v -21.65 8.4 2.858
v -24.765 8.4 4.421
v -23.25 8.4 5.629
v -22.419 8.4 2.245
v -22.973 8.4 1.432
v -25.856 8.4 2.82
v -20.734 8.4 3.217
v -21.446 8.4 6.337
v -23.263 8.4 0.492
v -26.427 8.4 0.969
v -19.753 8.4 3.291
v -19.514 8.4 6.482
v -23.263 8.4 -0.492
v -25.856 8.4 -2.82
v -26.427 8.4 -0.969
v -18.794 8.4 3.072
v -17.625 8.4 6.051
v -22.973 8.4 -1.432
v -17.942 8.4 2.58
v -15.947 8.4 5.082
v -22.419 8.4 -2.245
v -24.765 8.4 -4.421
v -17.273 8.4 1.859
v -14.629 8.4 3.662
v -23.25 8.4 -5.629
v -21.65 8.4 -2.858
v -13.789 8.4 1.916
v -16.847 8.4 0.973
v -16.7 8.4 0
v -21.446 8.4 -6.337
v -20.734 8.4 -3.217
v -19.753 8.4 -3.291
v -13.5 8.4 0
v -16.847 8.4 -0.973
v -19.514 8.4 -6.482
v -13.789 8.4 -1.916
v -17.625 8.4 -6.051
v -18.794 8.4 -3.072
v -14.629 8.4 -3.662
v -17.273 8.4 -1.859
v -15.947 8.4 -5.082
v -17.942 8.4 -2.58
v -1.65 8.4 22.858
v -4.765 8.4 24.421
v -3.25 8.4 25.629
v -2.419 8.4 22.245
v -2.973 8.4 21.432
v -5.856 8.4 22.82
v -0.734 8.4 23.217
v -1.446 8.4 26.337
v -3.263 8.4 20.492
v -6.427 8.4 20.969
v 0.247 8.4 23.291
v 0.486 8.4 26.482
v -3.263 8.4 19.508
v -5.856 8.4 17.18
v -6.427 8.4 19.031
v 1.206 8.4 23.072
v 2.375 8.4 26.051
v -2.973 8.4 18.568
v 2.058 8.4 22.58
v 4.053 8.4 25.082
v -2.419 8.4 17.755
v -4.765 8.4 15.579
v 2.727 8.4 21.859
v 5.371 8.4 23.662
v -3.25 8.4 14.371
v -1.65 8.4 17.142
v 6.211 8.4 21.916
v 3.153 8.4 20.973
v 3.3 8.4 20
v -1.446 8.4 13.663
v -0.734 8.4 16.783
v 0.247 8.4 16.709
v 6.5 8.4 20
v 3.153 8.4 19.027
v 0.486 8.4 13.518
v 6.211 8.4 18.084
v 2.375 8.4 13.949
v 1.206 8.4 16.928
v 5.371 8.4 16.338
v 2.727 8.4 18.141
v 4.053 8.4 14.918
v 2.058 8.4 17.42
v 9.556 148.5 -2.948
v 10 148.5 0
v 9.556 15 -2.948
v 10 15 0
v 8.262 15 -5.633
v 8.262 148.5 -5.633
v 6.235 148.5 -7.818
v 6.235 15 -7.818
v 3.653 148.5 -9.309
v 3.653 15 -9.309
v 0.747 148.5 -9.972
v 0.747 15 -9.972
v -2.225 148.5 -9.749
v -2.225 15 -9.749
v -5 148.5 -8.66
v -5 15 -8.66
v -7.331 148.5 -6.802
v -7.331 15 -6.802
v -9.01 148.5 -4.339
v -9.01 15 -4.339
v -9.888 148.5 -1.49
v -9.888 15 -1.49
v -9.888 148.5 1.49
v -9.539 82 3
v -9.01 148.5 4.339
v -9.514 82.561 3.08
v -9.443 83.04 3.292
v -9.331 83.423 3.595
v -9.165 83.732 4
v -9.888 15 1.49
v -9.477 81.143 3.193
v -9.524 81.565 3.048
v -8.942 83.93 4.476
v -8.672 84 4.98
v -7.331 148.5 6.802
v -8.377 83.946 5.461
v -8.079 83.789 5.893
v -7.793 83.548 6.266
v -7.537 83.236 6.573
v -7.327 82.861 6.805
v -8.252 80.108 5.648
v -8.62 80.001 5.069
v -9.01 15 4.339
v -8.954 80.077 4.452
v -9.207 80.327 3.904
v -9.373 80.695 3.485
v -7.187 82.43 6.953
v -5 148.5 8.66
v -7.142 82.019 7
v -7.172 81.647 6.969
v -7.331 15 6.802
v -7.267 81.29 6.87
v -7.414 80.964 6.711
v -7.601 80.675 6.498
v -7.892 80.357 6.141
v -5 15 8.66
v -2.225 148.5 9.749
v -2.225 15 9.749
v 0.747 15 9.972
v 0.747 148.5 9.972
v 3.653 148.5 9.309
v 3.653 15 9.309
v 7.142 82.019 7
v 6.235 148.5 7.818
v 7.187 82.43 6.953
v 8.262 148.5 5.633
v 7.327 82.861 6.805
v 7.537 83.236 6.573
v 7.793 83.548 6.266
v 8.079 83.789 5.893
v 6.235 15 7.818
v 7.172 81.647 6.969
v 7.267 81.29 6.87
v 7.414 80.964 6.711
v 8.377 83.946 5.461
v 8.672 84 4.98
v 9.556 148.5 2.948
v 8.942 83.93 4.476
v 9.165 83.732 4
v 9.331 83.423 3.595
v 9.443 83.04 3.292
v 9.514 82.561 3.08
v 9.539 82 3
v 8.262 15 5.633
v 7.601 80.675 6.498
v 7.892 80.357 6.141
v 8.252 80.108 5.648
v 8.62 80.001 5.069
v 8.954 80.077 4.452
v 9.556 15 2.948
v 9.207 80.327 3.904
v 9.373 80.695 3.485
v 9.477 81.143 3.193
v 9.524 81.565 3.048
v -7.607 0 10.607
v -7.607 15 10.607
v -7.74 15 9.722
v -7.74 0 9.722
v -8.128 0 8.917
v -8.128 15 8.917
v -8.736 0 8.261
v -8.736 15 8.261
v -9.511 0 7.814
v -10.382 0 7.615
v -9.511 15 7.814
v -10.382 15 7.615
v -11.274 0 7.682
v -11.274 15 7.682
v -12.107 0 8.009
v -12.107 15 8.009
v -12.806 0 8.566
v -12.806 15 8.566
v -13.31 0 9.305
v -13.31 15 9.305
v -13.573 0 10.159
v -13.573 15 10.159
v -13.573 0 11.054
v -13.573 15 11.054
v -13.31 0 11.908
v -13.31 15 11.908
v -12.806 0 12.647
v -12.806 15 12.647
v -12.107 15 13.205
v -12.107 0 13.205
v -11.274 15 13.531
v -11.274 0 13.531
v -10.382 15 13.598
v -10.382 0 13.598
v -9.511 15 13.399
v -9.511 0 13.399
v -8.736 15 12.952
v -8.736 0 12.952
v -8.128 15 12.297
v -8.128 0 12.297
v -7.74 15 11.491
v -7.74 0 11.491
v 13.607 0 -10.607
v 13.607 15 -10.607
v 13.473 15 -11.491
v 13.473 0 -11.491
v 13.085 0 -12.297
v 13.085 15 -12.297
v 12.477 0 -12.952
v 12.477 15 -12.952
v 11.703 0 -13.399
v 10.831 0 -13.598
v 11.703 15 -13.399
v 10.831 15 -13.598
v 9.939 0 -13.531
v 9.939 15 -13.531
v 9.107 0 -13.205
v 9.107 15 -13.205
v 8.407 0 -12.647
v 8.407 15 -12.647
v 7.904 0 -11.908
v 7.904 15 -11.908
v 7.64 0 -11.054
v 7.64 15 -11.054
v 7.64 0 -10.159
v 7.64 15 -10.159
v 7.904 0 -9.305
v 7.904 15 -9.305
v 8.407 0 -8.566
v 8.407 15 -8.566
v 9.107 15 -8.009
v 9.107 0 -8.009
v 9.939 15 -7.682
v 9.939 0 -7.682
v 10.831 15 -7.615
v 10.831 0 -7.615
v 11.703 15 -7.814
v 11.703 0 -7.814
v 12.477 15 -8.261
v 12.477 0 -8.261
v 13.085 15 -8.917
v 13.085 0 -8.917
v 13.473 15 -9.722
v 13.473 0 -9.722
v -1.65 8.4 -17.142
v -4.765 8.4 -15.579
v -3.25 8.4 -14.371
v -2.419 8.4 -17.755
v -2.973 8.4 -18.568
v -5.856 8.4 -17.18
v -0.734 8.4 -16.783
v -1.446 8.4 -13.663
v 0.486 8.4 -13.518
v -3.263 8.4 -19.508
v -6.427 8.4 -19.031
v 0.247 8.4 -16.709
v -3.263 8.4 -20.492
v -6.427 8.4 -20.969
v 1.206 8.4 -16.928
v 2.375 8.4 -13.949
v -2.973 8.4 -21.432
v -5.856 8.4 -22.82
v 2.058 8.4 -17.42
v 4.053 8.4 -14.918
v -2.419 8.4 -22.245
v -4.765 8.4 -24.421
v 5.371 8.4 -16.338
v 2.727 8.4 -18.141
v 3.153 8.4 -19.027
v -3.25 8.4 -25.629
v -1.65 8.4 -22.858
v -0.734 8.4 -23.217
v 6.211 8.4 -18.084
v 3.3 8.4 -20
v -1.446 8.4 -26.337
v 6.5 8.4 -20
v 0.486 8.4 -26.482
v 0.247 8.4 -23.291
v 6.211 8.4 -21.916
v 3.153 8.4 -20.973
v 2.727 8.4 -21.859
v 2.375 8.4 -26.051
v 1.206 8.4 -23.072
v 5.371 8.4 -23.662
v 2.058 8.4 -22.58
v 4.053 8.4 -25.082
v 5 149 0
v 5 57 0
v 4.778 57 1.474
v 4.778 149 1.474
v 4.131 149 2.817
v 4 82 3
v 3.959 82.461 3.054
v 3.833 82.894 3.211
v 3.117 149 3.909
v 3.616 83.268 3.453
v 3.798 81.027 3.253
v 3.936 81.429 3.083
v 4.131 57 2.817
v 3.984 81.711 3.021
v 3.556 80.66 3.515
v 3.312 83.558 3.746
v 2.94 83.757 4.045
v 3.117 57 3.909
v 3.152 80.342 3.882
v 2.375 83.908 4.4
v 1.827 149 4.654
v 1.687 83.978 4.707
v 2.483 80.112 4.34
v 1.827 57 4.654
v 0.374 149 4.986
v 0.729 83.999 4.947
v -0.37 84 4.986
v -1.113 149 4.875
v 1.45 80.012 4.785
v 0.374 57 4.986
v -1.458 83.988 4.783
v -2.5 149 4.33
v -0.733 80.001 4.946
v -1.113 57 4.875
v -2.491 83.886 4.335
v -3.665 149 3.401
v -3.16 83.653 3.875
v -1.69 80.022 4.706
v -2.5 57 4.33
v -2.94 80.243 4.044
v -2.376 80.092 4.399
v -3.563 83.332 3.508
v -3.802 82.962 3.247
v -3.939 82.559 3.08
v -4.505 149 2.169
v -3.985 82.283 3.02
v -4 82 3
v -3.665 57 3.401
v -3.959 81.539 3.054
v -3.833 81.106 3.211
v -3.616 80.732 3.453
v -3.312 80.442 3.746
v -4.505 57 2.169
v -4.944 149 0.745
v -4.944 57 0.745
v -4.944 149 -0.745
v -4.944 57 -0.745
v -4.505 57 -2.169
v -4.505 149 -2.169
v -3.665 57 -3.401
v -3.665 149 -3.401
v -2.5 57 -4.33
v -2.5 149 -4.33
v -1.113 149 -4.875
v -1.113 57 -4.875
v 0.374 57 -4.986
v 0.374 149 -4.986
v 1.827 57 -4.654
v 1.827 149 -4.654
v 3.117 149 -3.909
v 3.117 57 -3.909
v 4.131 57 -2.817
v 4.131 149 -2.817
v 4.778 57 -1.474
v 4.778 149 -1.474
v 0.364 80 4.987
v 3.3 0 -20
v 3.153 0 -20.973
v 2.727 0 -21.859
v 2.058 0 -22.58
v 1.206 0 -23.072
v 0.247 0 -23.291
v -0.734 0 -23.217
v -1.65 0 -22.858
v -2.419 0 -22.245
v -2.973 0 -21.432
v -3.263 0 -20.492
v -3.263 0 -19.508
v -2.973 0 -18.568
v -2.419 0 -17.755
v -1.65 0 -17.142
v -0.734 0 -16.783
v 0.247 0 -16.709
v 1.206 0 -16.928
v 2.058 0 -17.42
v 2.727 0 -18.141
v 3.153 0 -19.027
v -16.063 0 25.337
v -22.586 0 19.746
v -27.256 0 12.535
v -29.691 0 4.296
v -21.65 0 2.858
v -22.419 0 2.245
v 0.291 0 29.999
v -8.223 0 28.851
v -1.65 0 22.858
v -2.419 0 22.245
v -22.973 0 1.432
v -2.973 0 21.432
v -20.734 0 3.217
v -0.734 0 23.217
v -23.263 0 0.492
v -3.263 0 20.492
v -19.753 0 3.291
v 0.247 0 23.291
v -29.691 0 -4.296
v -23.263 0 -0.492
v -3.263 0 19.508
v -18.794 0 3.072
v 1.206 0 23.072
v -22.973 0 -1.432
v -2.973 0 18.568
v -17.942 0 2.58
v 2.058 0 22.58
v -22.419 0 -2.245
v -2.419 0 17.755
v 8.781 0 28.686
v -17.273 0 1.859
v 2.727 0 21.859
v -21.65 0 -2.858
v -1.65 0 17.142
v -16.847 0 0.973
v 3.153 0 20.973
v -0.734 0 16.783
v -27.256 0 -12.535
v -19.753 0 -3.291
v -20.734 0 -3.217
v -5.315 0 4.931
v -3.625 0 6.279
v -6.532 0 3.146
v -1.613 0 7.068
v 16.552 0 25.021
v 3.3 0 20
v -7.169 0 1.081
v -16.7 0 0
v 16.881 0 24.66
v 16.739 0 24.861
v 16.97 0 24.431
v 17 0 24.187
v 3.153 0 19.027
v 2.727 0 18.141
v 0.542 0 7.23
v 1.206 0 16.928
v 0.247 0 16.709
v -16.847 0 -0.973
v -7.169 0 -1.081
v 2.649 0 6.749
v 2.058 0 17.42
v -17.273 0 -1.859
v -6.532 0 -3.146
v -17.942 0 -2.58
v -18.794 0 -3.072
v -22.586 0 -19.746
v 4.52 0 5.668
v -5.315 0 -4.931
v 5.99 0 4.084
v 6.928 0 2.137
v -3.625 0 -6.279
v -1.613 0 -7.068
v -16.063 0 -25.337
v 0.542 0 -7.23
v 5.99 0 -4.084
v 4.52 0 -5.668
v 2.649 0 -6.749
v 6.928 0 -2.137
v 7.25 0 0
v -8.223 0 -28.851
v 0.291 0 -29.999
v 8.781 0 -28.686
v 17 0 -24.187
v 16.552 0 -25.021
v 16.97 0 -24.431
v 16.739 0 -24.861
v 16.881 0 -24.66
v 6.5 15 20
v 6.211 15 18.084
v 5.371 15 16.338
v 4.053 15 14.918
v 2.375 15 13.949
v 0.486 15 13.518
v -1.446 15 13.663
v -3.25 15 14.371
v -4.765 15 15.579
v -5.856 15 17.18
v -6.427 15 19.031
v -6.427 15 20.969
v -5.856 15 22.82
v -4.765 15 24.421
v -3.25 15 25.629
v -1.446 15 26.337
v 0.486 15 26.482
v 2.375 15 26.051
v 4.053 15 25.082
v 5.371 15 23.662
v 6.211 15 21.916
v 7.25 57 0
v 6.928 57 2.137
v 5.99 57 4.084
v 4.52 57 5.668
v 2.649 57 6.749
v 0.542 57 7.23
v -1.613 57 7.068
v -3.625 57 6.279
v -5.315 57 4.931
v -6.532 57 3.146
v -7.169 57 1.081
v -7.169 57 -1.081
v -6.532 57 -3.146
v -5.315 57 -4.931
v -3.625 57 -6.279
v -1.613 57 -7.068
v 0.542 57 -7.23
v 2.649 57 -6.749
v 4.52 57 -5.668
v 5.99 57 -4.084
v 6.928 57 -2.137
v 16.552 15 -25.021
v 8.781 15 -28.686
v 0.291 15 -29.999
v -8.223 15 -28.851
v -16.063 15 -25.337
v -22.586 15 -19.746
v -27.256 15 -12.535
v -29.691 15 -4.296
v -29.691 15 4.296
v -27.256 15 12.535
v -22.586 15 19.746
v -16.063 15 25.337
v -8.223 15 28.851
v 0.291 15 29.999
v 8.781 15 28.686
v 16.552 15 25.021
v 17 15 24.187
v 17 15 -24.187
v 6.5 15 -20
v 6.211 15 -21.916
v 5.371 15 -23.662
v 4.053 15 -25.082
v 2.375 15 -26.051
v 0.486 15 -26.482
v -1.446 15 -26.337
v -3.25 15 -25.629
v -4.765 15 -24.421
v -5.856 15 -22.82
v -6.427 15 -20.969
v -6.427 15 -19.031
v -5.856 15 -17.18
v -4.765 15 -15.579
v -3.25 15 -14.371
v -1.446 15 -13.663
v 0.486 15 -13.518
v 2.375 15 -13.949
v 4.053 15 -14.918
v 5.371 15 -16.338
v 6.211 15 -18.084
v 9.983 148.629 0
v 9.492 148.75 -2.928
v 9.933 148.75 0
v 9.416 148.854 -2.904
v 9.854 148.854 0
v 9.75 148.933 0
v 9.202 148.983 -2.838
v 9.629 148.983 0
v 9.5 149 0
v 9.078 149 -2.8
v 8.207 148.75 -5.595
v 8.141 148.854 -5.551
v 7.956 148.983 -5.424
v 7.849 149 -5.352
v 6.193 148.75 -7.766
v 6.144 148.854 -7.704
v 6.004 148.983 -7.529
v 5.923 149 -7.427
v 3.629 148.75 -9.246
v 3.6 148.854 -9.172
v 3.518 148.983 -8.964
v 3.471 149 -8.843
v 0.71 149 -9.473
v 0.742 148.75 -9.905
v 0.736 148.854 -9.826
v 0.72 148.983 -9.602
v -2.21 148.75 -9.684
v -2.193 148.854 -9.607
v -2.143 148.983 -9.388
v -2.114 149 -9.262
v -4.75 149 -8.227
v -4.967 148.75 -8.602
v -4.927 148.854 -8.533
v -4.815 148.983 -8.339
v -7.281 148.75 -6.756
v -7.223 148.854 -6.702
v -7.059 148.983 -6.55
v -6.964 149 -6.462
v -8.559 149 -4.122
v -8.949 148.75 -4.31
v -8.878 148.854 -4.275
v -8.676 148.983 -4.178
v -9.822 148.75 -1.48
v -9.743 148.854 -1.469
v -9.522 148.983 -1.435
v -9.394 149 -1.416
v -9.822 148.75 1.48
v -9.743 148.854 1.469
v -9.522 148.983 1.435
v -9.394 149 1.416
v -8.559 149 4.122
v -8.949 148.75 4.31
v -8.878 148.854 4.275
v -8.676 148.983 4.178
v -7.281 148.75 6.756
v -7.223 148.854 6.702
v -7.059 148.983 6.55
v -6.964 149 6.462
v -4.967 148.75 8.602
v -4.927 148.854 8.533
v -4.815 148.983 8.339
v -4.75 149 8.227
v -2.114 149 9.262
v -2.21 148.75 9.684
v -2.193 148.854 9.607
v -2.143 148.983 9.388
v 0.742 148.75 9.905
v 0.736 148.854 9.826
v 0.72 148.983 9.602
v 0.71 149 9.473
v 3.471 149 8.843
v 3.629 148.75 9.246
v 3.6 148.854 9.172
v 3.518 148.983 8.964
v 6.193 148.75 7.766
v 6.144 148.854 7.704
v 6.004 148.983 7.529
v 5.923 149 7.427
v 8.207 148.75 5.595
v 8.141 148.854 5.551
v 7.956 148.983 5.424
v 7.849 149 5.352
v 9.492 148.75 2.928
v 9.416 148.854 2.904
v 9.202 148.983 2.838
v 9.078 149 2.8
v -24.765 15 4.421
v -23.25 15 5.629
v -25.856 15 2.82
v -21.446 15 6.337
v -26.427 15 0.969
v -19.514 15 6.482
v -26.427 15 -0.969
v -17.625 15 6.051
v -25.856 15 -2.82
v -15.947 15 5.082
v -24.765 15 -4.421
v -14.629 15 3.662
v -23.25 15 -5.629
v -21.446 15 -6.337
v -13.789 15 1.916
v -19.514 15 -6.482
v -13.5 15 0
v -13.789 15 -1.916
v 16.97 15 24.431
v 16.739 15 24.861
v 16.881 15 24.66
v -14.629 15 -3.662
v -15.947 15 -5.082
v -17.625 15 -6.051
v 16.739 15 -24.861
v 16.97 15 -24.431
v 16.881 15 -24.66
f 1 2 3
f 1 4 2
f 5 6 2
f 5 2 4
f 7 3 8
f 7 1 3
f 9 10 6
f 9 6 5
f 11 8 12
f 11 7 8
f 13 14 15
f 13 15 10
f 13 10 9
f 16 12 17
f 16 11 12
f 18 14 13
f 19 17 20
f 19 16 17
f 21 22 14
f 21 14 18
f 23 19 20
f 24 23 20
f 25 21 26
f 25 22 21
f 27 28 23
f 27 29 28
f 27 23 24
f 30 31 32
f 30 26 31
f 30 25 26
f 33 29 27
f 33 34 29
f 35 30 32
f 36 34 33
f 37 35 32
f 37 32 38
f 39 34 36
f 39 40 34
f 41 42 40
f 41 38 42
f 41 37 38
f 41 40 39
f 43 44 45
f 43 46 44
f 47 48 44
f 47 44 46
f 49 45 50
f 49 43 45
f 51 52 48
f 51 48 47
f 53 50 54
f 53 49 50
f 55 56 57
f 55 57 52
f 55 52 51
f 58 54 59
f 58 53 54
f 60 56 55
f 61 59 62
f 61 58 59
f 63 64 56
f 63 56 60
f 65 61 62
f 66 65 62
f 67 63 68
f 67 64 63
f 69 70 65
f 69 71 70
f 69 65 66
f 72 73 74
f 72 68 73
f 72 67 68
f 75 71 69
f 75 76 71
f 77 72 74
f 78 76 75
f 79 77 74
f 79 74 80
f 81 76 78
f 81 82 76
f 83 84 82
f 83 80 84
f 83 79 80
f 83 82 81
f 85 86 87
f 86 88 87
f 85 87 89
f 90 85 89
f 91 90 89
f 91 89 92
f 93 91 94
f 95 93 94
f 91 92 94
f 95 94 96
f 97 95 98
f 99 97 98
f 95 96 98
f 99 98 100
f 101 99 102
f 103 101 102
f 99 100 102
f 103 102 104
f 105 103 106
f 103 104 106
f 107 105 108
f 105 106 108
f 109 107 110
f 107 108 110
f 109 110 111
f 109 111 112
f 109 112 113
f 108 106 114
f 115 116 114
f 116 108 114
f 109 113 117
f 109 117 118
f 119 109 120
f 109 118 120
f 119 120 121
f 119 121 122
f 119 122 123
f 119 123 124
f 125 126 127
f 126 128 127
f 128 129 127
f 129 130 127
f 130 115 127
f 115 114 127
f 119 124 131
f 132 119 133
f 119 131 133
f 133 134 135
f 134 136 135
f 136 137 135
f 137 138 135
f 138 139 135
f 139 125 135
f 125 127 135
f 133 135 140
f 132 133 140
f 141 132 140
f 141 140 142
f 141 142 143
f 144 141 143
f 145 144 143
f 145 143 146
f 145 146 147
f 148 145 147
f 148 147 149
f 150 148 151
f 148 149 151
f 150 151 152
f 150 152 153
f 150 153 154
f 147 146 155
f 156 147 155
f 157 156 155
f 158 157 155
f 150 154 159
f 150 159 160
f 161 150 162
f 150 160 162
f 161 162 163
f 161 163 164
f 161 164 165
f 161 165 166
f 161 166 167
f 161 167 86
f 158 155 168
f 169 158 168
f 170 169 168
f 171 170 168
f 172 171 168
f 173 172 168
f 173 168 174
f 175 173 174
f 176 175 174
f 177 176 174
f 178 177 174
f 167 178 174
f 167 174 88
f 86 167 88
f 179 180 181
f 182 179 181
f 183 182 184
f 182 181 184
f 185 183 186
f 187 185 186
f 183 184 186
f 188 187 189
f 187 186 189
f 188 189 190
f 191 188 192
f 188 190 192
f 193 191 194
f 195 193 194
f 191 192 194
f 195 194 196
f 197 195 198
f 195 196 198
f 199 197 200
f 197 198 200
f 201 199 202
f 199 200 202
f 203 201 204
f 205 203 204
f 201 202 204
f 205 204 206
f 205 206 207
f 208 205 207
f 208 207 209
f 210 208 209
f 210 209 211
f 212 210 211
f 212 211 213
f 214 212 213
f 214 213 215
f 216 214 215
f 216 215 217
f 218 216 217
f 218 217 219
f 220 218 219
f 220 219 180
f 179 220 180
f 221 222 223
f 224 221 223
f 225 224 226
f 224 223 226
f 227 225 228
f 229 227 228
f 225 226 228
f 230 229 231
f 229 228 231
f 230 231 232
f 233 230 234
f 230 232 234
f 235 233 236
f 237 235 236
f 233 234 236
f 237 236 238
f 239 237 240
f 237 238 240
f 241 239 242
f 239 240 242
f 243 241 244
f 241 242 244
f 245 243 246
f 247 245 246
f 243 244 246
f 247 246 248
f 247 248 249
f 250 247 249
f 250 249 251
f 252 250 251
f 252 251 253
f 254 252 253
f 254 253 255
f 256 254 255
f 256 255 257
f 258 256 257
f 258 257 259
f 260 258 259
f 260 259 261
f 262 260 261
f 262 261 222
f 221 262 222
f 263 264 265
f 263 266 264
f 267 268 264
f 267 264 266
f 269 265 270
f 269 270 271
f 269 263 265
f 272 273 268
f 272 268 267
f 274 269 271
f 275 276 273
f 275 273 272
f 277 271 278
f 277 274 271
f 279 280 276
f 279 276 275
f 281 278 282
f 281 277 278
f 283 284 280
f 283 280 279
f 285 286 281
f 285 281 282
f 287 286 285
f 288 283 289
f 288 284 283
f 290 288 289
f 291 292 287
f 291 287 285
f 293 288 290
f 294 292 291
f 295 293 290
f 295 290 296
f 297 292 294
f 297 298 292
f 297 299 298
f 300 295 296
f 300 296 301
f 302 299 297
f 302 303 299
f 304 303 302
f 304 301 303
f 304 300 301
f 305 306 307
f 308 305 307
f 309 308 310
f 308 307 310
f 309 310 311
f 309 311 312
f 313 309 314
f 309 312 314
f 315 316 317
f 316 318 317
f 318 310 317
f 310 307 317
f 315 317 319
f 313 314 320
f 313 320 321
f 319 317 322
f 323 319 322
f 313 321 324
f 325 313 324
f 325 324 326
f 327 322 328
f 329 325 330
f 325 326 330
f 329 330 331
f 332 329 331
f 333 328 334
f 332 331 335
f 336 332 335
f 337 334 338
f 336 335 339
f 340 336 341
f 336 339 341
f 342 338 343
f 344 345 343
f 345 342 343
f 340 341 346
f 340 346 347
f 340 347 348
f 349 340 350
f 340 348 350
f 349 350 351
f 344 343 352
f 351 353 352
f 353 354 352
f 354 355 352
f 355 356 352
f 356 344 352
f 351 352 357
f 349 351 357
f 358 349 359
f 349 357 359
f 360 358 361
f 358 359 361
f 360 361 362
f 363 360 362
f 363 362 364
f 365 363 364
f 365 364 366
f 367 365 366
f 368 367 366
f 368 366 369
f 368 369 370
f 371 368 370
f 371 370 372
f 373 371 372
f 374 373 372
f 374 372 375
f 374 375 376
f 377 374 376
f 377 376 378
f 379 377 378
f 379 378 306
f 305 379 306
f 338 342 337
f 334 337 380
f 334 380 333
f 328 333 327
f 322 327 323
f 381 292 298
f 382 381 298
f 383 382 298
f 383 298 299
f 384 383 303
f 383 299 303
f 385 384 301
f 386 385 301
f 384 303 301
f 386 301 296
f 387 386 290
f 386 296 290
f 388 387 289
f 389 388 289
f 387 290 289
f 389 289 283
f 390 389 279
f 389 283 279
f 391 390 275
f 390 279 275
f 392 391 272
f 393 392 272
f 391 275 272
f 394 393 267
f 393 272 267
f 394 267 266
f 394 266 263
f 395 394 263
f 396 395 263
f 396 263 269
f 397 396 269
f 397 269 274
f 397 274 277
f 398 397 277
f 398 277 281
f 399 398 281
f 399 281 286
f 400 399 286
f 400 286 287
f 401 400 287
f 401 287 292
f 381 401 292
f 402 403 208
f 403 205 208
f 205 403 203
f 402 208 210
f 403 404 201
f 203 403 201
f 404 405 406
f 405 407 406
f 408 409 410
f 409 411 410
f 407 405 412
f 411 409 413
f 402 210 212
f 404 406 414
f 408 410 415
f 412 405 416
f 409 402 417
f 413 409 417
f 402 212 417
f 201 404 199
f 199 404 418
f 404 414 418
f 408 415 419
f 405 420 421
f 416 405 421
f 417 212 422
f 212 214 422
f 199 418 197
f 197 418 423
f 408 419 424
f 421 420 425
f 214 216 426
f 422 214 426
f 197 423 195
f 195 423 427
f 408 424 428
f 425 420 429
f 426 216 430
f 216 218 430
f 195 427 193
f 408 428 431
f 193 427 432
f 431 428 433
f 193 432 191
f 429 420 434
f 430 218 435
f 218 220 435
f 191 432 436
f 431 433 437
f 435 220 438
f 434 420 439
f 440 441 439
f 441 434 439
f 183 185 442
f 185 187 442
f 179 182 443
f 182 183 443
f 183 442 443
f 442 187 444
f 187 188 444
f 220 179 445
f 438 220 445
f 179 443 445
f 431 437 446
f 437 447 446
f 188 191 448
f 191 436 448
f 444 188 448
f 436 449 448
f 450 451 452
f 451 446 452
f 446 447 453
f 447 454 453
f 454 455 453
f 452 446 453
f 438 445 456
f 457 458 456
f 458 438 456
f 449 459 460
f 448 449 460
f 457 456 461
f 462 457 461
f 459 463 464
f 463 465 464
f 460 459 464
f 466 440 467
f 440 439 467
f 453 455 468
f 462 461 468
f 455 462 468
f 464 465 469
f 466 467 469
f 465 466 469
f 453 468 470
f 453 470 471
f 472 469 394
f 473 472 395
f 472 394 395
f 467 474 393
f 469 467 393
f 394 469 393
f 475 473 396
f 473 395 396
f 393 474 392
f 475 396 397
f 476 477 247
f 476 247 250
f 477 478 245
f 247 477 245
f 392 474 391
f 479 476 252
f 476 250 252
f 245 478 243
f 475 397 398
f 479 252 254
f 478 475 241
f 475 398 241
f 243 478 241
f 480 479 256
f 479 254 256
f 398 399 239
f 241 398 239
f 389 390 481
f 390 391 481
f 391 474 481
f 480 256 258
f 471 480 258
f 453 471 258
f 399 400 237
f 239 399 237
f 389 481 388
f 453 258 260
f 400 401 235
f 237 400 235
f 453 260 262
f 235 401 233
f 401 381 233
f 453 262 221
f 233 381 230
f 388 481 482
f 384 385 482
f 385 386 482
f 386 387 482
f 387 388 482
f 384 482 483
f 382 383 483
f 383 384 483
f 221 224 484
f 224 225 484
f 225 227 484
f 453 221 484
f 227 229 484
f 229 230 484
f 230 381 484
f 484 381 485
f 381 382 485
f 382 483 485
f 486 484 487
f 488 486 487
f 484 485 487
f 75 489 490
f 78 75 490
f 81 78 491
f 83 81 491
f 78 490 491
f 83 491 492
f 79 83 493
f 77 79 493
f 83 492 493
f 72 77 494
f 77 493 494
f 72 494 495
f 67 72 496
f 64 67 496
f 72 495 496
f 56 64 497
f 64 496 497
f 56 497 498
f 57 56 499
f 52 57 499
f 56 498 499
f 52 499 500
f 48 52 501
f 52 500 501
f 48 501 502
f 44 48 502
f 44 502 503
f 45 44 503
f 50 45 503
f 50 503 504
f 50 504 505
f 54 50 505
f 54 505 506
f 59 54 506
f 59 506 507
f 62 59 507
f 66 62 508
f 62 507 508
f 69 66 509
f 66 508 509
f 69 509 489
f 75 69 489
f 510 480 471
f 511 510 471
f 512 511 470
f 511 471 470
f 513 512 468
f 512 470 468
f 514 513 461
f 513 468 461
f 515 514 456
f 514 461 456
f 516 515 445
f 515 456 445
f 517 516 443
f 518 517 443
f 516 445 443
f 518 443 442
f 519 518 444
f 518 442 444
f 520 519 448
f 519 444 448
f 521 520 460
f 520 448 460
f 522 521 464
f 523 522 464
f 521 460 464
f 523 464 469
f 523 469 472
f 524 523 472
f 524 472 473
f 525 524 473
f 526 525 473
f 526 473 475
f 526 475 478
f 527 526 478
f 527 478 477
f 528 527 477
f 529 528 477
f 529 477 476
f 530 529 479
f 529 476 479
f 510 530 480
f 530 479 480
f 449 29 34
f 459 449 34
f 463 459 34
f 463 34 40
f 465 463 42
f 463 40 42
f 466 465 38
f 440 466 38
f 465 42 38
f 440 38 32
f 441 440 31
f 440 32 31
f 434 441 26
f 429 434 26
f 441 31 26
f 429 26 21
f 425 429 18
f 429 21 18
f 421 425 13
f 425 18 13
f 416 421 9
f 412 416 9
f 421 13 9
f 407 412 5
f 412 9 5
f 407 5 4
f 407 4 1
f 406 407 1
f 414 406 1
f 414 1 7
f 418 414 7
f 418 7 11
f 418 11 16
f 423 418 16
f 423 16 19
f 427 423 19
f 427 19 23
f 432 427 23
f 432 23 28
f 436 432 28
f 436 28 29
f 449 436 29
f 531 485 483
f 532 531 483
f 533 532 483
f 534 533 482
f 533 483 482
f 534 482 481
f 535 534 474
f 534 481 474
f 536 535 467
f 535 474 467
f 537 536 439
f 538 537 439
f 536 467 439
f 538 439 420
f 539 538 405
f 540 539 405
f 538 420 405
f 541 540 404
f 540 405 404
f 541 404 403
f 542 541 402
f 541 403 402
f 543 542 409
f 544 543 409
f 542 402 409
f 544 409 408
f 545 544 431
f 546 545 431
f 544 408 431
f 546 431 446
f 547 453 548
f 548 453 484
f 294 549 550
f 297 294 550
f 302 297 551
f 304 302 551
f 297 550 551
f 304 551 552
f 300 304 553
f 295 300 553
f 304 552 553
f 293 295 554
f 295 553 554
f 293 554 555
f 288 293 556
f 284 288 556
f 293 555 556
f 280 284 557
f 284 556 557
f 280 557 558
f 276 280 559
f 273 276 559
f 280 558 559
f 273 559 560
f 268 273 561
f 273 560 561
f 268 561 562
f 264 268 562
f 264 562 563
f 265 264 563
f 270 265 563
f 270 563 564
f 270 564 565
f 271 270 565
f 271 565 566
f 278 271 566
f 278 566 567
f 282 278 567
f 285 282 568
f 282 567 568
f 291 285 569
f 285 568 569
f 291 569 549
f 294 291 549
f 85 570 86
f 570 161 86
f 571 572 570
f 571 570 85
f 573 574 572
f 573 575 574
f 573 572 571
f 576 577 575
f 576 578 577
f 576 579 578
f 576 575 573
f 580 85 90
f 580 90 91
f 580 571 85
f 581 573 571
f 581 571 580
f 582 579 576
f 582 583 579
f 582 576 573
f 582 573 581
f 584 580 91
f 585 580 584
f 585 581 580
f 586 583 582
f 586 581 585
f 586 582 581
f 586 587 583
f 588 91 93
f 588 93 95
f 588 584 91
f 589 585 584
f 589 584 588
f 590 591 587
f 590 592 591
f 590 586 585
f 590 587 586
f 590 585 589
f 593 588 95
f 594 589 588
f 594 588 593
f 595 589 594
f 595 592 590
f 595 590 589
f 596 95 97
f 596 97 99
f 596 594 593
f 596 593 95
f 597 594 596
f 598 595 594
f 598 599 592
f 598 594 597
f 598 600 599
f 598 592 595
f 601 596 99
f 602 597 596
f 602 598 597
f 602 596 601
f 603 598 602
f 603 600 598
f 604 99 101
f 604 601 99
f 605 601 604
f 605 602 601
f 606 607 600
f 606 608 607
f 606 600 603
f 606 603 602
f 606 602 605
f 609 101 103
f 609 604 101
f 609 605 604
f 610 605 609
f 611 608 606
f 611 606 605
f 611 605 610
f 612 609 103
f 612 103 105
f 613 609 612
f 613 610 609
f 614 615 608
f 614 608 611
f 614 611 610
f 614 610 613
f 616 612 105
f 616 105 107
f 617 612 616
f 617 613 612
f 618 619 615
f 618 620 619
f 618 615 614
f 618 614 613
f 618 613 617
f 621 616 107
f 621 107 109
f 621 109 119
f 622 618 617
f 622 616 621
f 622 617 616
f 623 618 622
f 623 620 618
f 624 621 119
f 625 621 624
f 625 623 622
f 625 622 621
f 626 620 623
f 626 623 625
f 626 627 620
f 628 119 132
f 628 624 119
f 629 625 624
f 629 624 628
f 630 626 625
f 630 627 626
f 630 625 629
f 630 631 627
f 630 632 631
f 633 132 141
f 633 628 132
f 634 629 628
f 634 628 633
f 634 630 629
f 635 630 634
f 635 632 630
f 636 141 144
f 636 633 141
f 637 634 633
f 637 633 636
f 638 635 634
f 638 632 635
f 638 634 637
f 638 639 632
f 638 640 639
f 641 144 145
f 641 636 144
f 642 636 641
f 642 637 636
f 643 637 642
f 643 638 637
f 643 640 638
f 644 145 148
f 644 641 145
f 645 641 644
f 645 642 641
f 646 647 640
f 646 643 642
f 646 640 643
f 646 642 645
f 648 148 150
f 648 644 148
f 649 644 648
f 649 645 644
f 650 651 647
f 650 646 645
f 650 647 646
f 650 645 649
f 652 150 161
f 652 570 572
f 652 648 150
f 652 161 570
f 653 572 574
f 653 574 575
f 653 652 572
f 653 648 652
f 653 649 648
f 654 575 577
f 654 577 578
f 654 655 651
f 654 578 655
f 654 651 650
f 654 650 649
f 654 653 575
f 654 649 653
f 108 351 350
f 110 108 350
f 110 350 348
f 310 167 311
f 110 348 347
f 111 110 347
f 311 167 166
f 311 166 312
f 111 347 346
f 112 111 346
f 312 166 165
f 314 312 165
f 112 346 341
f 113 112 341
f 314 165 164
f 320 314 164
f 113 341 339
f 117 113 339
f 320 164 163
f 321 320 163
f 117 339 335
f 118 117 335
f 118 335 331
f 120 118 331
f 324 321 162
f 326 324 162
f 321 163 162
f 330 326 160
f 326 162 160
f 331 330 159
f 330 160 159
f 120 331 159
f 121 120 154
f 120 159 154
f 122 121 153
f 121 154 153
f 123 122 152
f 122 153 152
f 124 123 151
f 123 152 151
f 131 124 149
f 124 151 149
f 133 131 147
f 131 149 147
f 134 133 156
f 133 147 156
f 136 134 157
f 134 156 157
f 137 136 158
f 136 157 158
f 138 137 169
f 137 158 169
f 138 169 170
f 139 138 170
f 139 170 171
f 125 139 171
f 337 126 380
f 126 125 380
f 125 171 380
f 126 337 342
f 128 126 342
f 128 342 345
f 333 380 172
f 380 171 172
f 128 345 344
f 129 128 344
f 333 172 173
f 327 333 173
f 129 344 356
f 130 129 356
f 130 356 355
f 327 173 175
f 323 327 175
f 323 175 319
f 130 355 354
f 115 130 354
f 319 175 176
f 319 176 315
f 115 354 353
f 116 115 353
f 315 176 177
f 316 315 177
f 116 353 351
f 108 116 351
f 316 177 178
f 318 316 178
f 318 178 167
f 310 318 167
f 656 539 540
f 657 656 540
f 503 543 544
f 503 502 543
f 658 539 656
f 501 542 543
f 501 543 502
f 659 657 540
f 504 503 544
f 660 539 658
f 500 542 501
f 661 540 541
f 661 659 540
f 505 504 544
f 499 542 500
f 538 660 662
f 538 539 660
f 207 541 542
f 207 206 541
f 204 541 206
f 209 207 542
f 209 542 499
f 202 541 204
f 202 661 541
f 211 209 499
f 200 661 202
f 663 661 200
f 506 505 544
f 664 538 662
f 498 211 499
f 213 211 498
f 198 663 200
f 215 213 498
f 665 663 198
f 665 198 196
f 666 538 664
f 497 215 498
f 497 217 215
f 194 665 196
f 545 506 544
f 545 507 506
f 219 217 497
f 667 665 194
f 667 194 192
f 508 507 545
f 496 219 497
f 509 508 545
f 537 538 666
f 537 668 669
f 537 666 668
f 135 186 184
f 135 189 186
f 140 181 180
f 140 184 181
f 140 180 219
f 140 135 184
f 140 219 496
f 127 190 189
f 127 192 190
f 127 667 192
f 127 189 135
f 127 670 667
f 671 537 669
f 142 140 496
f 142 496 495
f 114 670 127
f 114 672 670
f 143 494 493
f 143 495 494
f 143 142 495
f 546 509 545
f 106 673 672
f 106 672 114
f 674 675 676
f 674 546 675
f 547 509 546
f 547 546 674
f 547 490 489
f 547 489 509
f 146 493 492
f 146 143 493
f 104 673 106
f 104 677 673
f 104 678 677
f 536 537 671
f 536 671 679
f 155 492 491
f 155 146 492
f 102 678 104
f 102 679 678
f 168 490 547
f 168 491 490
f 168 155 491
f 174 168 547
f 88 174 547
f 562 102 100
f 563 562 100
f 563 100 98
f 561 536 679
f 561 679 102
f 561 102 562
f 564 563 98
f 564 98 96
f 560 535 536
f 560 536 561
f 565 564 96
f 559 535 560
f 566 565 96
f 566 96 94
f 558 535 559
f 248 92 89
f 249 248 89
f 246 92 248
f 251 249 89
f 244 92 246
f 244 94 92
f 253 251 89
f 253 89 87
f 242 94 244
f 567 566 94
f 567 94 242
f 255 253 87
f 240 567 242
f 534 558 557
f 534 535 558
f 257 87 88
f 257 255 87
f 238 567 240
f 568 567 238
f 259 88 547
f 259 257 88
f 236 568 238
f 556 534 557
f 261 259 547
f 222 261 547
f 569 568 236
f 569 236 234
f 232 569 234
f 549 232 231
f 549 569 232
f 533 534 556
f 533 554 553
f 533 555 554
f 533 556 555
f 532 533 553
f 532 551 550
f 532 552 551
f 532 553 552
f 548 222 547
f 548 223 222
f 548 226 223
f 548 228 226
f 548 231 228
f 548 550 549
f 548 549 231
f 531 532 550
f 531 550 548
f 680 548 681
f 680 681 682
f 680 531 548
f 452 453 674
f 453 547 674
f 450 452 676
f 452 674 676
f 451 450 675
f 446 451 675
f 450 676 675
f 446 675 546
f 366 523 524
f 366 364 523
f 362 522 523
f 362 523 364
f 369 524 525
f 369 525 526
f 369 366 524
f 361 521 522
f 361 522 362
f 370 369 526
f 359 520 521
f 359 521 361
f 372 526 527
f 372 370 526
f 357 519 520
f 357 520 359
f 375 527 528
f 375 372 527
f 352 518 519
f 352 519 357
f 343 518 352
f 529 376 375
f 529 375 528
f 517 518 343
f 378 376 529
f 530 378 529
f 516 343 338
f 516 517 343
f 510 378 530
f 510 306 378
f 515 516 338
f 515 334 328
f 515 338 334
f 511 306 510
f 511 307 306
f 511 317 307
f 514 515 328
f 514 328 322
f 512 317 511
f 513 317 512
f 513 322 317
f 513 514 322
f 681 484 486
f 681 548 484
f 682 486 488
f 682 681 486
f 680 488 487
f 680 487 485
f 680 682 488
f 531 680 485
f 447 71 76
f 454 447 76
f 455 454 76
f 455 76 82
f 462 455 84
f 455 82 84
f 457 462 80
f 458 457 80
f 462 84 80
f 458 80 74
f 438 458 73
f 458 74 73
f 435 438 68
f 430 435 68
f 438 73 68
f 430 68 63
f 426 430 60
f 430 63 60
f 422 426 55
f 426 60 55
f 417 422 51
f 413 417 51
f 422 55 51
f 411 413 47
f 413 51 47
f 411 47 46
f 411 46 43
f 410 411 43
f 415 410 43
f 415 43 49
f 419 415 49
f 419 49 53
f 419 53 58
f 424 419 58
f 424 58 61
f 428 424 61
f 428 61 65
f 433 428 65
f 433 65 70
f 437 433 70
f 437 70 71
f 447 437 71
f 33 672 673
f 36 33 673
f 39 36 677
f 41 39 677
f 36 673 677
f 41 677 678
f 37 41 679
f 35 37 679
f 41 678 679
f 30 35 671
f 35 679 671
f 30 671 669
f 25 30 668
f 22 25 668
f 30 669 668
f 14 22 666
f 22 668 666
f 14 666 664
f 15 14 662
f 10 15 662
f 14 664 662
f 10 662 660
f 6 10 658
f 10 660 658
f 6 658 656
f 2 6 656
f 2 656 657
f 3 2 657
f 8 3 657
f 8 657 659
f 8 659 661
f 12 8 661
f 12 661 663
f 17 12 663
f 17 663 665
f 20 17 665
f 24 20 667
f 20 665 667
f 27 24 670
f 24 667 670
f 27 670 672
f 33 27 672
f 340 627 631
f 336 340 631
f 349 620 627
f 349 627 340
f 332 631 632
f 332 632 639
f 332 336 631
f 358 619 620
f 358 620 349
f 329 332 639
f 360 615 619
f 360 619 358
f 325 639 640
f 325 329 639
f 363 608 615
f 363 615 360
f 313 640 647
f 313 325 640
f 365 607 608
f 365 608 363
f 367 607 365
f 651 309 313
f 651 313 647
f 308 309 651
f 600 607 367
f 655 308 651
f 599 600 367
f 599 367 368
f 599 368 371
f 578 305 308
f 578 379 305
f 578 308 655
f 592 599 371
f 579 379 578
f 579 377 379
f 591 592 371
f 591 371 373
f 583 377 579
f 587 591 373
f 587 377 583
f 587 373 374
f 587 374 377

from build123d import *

# Parameters (mm, degrees)
BOSS_EXTRUDE1_DEPTH = 15
SKETCH2_R           = 10
BOSS_EXTRUDE2_DEPTH = 134
SKETCH4_R           = 7.25
CUT_EXTRUDE1_DEPTH  = 57
SKETCH5_R           = 5
CUT_EXTRUDE2_DEPTH  = 93
SKETCH7_R           = 6.5
CUT_EXTRUDE3_DEPTH  = 6.6
SKETCH8_R           = 3.3
CUT_EXTRUDE4_DEPTH  = 9.4
SKETCH9_R           = 3
CUT_EXTRUDE5_DEPTH  = 16
FILLET1_R           = 1
FILLET2_R           = 0.5
SKETCH10_R          = 2
CUT_EXTRUDE11_DEPTH = 48


with BuildPart() as part:
    # Sketch1 → Boss-Extrude1 (new body)
    with BuildSketch(Plane(origin=(0, 0, 0), x_dir=(1, 0, 0), z_dir=(0, 1, 0))):
        with BuildLine():
            Line((17, -24.718414189), (17, 24.718414189))
            ThreePointArc((17, 24.718414189), (-30, 0), (17, -24.718414189))
        make_face()
    extrude(amount=BOSS_EXTRUDE1_DEPTH)

    # Sketch2 → Boss-Extrude2 (add)
    with BuildSketch(Plane(origin=(0, 15, 0), x_dir=(1, 0, 0), z_dir=(0, 1, 0))):
        Circle(SKETCH2_R)
    extrude(amount=BOSS_EXTRUDE2_DEPTH)

    # Sketch4 → Cut-Extrude1 (cut)
    with BuildSketch(Plane.XZ):
        Circle(SKETCH4_R)
    extrude(amount=-CUT_EXTRUDE1_DEPTH, mode=Mode.SUBTRACT)

    # Sketch5 → Cut-Extrude2 (cut, through all)
    with BuildSketch(Plane.XZ.offset(-57)):
        Circle(SKETCH5_R)
    extrude(amount=-CUT_EXTRUDE2_DEPTH, mode=Mode.SUBTRACT)

    # Sketch7 → Cut-Extrude3 (cut)
    with BuildSketch(Plane(origin=(0, 15, 0), x_dir=(1, 0, 0), z_dir=(0, 1, 0))):
        with Locations((0, -20)):
            Circle(SKETCH7_R)
        with Locations((-20, 0)):
            Circle(SKETCH7_R)
        with Locations((0, 20)):
            Circle(SKETCH7_R)
    extrude(amount=-CUT_EXTRUDE3_DEPTH, mode=Mode.SUBTRACT)

    # Sketch8 → Cut-Extrude4 (cut, through all)
    with BuildSketch(Plane(origin=(0, 8.4, 0), x_dir=(1, 0, 0), z_dir=(0, 1, 0))):
        with Locations((0, -20)):
            Circle(SKETCH8_R)
        with Locations((-20, 0)):
            Circle(SKETCH8_R)
        with Locations((0, 20)):
            Circle(SKETCH8_R)
    extrude(amount=-CUT_EXTRUDE4_DEPTH, mode=Mode.SUBTRACT)

    # Sketch9 → Cut-Extrude5 (cut, through all)
    with BuildSketch(Plane(origin=(0, 15, 0), x_dir=(1, 0, 0), z_dir=(0, 1, 0))):
        with Locations((-10.606601718, -10.606601718)):
            Circle(SKETCH9_R)
        with Locations((10.606601718, 10.606601718)):
            Circle(SKETCH9_R)
    extrude(amount=-CUT_EXTRUDE5_DEPTH, mode=Mode.SUBTRACT)

    # Fillet1
    fillet1_edges = [part.edges().sort_by_distance(p)[0] for p in [
        (17, 7.5, -24.718414189),
        (17, 7.5, 24.718414189),
    ]]
    fillet(fillet1_edges, radius=FILLET1_R)

    # Fillet2
    fillet2_edges = [part.edges().sort_by_distance(p)[0] for p in [
        (-10, 149, 0),
    ]]
    fillet(fillet2_edges, radius=FILLET2_R)

    # Sketch10 → Cut-Extrude11 (cut, through all)
    with BuildSketch(Plane(origin=(17, 0, 0), x_dir=(0, 0, -1), z_dir=(1, 0, 0))):
        with Locations((-5, 82)):
            Circle(SKETCH10_R)
    extrude(amount=-CUT_EXTRUDE11_DEPTH, mode=Mode.SUBTRACT)


solid = part.part
